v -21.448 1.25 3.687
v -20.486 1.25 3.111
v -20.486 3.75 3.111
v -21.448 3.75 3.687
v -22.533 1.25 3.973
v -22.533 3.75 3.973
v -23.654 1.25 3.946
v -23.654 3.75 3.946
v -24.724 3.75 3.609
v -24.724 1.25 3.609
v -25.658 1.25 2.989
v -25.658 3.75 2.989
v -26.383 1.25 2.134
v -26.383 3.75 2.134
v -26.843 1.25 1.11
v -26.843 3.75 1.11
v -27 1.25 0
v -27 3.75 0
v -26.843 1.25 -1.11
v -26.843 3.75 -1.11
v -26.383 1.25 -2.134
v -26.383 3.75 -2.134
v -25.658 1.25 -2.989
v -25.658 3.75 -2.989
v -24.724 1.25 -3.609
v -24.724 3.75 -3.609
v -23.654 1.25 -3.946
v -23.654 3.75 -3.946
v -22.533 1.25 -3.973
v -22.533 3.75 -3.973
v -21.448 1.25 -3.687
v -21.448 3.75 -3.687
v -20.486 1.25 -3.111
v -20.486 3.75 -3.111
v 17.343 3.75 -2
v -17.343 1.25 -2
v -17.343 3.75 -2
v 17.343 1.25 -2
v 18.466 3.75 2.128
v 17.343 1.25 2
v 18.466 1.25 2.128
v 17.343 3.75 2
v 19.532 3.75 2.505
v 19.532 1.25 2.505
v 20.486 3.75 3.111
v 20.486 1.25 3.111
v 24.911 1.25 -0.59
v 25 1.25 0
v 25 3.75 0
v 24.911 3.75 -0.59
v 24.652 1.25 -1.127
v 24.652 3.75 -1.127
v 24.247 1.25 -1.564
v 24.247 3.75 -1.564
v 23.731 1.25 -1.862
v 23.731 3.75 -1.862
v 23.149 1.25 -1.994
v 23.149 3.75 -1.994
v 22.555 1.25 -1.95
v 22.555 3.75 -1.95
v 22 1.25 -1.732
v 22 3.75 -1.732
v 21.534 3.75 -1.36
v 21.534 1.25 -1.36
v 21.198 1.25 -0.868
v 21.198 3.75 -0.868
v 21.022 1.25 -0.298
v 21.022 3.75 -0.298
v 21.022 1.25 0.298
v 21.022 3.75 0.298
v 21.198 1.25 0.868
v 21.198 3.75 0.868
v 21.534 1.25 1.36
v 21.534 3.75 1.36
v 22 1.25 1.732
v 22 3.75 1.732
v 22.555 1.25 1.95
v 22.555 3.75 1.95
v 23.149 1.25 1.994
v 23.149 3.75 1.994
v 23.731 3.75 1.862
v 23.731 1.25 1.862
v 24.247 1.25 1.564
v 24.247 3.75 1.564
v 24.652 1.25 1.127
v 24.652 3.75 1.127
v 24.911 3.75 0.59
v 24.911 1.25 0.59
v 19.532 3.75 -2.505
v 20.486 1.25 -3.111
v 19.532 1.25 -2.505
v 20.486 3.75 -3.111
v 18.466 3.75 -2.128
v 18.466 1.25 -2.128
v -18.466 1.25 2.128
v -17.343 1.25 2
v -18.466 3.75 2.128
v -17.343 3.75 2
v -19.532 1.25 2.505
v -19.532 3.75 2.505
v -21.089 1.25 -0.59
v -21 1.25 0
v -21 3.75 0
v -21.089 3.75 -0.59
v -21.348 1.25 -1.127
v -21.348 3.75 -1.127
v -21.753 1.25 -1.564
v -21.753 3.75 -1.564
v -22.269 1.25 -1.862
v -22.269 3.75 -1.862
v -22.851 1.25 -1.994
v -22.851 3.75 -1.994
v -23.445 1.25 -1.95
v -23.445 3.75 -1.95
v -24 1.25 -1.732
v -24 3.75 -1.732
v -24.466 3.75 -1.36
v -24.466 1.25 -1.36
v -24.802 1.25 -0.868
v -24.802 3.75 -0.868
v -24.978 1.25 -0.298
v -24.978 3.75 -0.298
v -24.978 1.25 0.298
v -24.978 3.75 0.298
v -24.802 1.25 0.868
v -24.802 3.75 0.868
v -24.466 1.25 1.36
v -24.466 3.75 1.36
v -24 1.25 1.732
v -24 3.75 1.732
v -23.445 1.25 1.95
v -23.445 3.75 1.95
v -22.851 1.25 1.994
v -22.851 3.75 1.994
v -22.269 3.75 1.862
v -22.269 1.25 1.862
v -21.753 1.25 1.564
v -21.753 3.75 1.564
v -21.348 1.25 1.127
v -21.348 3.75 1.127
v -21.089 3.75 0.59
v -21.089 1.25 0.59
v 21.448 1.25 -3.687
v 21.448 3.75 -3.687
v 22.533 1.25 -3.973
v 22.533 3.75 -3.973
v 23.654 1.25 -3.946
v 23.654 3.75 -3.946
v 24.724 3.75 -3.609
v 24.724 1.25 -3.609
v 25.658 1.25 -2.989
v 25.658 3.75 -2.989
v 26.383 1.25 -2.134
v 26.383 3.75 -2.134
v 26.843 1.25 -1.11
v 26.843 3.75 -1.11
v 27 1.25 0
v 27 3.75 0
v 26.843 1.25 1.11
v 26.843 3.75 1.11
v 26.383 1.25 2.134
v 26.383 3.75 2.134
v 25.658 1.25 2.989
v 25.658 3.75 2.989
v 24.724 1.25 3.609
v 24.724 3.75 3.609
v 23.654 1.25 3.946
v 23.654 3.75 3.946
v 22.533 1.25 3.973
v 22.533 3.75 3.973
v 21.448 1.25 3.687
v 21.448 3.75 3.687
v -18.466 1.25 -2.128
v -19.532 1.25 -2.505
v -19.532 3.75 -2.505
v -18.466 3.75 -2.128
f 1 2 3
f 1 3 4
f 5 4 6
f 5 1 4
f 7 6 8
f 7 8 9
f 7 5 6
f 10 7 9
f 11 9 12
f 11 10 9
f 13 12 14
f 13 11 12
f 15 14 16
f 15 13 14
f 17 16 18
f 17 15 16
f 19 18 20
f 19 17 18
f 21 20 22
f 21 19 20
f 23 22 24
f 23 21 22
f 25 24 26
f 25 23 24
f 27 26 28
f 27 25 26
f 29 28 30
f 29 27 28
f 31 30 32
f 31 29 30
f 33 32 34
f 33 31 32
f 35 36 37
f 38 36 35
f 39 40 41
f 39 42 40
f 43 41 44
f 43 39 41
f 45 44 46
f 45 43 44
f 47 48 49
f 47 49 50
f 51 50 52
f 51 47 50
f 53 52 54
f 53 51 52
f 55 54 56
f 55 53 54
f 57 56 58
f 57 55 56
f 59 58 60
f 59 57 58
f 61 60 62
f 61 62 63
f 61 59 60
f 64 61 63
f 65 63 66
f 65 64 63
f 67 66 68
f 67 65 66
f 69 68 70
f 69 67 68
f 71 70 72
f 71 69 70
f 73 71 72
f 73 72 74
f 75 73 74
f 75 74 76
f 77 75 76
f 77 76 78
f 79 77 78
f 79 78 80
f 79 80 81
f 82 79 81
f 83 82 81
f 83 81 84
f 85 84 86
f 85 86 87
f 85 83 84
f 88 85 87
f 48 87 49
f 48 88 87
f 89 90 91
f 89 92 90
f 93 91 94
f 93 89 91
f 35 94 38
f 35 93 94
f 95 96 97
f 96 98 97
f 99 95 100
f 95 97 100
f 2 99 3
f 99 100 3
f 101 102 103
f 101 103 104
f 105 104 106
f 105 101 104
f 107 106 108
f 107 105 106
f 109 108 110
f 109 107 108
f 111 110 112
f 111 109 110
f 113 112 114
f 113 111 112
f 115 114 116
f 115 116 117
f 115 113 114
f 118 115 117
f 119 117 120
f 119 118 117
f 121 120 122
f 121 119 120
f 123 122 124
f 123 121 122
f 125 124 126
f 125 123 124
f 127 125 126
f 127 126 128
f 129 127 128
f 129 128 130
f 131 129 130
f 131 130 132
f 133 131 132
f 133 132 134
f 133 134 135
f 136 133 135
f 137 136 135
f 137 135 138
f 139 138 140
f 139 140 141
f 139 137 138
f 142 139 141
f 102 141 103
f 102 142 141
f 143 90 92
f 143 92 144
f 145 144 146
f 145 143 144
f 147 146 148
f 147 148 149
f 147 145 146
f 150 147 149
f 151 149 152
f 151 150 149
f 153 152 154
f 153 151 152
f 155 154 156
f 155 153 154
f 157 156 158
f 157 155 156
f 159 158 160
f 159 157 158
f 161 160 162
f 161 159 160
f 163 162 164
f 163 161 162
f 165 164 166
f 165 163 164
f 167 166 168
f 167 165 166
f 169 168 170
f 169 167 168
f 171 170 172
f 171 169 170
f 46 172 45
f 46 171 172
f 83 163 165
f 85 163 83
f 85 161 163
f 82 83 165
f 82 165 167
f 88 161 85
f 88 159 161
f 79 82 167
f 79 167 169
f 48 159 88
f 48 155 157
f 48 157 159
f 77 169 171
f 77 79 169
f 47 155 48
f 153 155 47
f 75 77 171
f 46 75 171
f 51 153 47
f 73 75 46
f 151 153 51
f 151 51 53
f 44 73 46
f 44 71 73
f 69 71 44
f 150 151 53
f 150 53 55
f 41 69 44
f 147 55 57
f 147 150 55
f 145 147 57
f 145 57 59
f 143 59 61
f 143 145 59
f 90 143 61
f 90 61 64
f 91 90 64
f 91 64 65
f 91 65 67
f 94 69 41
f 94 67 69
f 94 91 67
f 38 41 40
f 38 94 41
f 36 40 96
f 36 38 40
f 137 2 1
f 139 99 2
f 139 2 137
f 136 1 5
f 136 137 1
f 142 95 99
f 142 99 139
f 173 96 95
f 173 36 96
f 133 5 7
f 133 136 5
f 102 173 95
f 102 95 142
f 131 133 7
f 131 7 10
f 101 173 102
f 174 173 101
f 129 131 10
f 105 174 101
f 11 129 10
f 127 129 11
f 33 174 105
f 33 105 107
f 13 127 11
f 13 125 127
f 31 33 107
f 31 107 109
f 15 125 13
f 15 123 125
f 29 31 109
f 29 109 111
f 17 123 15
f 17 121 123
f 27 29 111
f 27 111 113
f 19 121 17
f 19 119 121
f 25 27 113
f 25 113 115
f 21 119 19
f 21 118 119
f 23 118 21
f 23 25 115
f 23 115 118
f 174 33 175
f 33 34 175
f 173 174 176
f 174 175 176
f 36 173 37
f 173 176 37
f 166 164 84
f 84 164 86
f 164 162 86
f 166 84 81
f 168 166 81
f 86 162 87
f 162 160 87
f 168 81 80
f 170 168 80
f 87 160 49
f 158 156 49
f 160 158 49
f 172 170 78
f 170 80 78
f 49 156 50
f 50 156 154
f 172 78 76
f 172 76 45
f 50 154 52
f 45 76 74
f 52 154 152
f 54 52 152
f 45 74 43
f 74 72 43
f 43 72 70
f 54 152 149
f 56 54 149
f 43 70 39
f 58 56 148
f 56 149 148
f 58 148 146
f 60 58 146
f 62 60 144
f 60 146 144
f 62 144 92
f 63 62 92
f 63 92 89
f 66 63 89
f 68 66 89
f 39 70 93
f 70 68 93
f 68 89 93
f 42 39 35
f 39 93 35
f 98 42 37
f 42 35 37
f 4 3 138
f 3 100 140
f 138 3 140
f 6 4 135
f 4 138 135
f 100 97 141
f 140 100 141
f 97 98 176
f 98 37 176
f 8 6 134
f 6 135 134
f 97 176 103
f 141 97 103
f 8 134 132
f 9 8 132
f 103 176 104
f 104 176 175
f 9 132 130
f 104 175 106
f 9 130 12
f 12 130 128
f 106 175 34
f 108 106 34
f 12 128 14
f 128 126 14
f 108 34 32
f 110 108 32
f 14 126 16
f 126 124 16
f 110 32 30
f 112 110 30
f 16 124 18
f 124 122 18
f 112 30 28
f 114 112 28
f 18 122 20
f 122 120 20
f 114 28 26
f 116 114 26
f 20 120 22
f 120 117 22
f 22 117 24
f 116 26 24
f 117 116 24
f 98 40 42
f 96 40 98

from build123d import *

# Parameters (mm, degrees)
SKETCH1_R           = 4
BOSS_EXTRUDE1_DEPTH = 5
FILLET1_R           = 10
SCALE1_SCALE        = 0.5


with BuildPart() as part:
    # Sketch1 → Boss-Extrude1 (new body)
    with BuildSketch(Plane(origin=(0, 0, 0), x_dir=(1, 0, 0), z_dir=(0, 1, 0))):
        with BuildLine():
            Line((39.07179677, -4), (-39.07179677, -4))
            ThreePointArc((-39.07179677, -4), (-54, 0), (-39.07179677, 4))
            Line((-39.07179677, 4), (39.07179677, 4))
            ThreePointArc((39.07179677, 4), (54, 0), (39.07179677, -4))
        make_face()
        with Locations((-46, 0)):
            Circle(SKETCH1_R, mode=Mode.SUBTRACT)
        with Locations((46, 0)):
            Circle(SKETCH1_R, mode=Mode.SUBTRACT)
    extrude(amount=BOSS_EXTRUDE1_DEPTH)

    # Fillet1
    fillet1_edges = [part.edges().sort_by_distance(p)[0] for p in [
        (-39.07179677, 2.5, -4),
        (39.07179677, 2.5, -4),
        (39.07179677, 2.5, 4),
        (-39.07179677, 2.5, 4),
    ]]
    fillet(fillet1_edges, radius=FILLET1_R)


with BuildPart() as part_1:
    # Scale1: scaled about (0, 2.5, 0)
    add(part.part.scale(SCALE1_SCALE).moved(Location((0, 1.25, 0))))


solid = part_1.part
